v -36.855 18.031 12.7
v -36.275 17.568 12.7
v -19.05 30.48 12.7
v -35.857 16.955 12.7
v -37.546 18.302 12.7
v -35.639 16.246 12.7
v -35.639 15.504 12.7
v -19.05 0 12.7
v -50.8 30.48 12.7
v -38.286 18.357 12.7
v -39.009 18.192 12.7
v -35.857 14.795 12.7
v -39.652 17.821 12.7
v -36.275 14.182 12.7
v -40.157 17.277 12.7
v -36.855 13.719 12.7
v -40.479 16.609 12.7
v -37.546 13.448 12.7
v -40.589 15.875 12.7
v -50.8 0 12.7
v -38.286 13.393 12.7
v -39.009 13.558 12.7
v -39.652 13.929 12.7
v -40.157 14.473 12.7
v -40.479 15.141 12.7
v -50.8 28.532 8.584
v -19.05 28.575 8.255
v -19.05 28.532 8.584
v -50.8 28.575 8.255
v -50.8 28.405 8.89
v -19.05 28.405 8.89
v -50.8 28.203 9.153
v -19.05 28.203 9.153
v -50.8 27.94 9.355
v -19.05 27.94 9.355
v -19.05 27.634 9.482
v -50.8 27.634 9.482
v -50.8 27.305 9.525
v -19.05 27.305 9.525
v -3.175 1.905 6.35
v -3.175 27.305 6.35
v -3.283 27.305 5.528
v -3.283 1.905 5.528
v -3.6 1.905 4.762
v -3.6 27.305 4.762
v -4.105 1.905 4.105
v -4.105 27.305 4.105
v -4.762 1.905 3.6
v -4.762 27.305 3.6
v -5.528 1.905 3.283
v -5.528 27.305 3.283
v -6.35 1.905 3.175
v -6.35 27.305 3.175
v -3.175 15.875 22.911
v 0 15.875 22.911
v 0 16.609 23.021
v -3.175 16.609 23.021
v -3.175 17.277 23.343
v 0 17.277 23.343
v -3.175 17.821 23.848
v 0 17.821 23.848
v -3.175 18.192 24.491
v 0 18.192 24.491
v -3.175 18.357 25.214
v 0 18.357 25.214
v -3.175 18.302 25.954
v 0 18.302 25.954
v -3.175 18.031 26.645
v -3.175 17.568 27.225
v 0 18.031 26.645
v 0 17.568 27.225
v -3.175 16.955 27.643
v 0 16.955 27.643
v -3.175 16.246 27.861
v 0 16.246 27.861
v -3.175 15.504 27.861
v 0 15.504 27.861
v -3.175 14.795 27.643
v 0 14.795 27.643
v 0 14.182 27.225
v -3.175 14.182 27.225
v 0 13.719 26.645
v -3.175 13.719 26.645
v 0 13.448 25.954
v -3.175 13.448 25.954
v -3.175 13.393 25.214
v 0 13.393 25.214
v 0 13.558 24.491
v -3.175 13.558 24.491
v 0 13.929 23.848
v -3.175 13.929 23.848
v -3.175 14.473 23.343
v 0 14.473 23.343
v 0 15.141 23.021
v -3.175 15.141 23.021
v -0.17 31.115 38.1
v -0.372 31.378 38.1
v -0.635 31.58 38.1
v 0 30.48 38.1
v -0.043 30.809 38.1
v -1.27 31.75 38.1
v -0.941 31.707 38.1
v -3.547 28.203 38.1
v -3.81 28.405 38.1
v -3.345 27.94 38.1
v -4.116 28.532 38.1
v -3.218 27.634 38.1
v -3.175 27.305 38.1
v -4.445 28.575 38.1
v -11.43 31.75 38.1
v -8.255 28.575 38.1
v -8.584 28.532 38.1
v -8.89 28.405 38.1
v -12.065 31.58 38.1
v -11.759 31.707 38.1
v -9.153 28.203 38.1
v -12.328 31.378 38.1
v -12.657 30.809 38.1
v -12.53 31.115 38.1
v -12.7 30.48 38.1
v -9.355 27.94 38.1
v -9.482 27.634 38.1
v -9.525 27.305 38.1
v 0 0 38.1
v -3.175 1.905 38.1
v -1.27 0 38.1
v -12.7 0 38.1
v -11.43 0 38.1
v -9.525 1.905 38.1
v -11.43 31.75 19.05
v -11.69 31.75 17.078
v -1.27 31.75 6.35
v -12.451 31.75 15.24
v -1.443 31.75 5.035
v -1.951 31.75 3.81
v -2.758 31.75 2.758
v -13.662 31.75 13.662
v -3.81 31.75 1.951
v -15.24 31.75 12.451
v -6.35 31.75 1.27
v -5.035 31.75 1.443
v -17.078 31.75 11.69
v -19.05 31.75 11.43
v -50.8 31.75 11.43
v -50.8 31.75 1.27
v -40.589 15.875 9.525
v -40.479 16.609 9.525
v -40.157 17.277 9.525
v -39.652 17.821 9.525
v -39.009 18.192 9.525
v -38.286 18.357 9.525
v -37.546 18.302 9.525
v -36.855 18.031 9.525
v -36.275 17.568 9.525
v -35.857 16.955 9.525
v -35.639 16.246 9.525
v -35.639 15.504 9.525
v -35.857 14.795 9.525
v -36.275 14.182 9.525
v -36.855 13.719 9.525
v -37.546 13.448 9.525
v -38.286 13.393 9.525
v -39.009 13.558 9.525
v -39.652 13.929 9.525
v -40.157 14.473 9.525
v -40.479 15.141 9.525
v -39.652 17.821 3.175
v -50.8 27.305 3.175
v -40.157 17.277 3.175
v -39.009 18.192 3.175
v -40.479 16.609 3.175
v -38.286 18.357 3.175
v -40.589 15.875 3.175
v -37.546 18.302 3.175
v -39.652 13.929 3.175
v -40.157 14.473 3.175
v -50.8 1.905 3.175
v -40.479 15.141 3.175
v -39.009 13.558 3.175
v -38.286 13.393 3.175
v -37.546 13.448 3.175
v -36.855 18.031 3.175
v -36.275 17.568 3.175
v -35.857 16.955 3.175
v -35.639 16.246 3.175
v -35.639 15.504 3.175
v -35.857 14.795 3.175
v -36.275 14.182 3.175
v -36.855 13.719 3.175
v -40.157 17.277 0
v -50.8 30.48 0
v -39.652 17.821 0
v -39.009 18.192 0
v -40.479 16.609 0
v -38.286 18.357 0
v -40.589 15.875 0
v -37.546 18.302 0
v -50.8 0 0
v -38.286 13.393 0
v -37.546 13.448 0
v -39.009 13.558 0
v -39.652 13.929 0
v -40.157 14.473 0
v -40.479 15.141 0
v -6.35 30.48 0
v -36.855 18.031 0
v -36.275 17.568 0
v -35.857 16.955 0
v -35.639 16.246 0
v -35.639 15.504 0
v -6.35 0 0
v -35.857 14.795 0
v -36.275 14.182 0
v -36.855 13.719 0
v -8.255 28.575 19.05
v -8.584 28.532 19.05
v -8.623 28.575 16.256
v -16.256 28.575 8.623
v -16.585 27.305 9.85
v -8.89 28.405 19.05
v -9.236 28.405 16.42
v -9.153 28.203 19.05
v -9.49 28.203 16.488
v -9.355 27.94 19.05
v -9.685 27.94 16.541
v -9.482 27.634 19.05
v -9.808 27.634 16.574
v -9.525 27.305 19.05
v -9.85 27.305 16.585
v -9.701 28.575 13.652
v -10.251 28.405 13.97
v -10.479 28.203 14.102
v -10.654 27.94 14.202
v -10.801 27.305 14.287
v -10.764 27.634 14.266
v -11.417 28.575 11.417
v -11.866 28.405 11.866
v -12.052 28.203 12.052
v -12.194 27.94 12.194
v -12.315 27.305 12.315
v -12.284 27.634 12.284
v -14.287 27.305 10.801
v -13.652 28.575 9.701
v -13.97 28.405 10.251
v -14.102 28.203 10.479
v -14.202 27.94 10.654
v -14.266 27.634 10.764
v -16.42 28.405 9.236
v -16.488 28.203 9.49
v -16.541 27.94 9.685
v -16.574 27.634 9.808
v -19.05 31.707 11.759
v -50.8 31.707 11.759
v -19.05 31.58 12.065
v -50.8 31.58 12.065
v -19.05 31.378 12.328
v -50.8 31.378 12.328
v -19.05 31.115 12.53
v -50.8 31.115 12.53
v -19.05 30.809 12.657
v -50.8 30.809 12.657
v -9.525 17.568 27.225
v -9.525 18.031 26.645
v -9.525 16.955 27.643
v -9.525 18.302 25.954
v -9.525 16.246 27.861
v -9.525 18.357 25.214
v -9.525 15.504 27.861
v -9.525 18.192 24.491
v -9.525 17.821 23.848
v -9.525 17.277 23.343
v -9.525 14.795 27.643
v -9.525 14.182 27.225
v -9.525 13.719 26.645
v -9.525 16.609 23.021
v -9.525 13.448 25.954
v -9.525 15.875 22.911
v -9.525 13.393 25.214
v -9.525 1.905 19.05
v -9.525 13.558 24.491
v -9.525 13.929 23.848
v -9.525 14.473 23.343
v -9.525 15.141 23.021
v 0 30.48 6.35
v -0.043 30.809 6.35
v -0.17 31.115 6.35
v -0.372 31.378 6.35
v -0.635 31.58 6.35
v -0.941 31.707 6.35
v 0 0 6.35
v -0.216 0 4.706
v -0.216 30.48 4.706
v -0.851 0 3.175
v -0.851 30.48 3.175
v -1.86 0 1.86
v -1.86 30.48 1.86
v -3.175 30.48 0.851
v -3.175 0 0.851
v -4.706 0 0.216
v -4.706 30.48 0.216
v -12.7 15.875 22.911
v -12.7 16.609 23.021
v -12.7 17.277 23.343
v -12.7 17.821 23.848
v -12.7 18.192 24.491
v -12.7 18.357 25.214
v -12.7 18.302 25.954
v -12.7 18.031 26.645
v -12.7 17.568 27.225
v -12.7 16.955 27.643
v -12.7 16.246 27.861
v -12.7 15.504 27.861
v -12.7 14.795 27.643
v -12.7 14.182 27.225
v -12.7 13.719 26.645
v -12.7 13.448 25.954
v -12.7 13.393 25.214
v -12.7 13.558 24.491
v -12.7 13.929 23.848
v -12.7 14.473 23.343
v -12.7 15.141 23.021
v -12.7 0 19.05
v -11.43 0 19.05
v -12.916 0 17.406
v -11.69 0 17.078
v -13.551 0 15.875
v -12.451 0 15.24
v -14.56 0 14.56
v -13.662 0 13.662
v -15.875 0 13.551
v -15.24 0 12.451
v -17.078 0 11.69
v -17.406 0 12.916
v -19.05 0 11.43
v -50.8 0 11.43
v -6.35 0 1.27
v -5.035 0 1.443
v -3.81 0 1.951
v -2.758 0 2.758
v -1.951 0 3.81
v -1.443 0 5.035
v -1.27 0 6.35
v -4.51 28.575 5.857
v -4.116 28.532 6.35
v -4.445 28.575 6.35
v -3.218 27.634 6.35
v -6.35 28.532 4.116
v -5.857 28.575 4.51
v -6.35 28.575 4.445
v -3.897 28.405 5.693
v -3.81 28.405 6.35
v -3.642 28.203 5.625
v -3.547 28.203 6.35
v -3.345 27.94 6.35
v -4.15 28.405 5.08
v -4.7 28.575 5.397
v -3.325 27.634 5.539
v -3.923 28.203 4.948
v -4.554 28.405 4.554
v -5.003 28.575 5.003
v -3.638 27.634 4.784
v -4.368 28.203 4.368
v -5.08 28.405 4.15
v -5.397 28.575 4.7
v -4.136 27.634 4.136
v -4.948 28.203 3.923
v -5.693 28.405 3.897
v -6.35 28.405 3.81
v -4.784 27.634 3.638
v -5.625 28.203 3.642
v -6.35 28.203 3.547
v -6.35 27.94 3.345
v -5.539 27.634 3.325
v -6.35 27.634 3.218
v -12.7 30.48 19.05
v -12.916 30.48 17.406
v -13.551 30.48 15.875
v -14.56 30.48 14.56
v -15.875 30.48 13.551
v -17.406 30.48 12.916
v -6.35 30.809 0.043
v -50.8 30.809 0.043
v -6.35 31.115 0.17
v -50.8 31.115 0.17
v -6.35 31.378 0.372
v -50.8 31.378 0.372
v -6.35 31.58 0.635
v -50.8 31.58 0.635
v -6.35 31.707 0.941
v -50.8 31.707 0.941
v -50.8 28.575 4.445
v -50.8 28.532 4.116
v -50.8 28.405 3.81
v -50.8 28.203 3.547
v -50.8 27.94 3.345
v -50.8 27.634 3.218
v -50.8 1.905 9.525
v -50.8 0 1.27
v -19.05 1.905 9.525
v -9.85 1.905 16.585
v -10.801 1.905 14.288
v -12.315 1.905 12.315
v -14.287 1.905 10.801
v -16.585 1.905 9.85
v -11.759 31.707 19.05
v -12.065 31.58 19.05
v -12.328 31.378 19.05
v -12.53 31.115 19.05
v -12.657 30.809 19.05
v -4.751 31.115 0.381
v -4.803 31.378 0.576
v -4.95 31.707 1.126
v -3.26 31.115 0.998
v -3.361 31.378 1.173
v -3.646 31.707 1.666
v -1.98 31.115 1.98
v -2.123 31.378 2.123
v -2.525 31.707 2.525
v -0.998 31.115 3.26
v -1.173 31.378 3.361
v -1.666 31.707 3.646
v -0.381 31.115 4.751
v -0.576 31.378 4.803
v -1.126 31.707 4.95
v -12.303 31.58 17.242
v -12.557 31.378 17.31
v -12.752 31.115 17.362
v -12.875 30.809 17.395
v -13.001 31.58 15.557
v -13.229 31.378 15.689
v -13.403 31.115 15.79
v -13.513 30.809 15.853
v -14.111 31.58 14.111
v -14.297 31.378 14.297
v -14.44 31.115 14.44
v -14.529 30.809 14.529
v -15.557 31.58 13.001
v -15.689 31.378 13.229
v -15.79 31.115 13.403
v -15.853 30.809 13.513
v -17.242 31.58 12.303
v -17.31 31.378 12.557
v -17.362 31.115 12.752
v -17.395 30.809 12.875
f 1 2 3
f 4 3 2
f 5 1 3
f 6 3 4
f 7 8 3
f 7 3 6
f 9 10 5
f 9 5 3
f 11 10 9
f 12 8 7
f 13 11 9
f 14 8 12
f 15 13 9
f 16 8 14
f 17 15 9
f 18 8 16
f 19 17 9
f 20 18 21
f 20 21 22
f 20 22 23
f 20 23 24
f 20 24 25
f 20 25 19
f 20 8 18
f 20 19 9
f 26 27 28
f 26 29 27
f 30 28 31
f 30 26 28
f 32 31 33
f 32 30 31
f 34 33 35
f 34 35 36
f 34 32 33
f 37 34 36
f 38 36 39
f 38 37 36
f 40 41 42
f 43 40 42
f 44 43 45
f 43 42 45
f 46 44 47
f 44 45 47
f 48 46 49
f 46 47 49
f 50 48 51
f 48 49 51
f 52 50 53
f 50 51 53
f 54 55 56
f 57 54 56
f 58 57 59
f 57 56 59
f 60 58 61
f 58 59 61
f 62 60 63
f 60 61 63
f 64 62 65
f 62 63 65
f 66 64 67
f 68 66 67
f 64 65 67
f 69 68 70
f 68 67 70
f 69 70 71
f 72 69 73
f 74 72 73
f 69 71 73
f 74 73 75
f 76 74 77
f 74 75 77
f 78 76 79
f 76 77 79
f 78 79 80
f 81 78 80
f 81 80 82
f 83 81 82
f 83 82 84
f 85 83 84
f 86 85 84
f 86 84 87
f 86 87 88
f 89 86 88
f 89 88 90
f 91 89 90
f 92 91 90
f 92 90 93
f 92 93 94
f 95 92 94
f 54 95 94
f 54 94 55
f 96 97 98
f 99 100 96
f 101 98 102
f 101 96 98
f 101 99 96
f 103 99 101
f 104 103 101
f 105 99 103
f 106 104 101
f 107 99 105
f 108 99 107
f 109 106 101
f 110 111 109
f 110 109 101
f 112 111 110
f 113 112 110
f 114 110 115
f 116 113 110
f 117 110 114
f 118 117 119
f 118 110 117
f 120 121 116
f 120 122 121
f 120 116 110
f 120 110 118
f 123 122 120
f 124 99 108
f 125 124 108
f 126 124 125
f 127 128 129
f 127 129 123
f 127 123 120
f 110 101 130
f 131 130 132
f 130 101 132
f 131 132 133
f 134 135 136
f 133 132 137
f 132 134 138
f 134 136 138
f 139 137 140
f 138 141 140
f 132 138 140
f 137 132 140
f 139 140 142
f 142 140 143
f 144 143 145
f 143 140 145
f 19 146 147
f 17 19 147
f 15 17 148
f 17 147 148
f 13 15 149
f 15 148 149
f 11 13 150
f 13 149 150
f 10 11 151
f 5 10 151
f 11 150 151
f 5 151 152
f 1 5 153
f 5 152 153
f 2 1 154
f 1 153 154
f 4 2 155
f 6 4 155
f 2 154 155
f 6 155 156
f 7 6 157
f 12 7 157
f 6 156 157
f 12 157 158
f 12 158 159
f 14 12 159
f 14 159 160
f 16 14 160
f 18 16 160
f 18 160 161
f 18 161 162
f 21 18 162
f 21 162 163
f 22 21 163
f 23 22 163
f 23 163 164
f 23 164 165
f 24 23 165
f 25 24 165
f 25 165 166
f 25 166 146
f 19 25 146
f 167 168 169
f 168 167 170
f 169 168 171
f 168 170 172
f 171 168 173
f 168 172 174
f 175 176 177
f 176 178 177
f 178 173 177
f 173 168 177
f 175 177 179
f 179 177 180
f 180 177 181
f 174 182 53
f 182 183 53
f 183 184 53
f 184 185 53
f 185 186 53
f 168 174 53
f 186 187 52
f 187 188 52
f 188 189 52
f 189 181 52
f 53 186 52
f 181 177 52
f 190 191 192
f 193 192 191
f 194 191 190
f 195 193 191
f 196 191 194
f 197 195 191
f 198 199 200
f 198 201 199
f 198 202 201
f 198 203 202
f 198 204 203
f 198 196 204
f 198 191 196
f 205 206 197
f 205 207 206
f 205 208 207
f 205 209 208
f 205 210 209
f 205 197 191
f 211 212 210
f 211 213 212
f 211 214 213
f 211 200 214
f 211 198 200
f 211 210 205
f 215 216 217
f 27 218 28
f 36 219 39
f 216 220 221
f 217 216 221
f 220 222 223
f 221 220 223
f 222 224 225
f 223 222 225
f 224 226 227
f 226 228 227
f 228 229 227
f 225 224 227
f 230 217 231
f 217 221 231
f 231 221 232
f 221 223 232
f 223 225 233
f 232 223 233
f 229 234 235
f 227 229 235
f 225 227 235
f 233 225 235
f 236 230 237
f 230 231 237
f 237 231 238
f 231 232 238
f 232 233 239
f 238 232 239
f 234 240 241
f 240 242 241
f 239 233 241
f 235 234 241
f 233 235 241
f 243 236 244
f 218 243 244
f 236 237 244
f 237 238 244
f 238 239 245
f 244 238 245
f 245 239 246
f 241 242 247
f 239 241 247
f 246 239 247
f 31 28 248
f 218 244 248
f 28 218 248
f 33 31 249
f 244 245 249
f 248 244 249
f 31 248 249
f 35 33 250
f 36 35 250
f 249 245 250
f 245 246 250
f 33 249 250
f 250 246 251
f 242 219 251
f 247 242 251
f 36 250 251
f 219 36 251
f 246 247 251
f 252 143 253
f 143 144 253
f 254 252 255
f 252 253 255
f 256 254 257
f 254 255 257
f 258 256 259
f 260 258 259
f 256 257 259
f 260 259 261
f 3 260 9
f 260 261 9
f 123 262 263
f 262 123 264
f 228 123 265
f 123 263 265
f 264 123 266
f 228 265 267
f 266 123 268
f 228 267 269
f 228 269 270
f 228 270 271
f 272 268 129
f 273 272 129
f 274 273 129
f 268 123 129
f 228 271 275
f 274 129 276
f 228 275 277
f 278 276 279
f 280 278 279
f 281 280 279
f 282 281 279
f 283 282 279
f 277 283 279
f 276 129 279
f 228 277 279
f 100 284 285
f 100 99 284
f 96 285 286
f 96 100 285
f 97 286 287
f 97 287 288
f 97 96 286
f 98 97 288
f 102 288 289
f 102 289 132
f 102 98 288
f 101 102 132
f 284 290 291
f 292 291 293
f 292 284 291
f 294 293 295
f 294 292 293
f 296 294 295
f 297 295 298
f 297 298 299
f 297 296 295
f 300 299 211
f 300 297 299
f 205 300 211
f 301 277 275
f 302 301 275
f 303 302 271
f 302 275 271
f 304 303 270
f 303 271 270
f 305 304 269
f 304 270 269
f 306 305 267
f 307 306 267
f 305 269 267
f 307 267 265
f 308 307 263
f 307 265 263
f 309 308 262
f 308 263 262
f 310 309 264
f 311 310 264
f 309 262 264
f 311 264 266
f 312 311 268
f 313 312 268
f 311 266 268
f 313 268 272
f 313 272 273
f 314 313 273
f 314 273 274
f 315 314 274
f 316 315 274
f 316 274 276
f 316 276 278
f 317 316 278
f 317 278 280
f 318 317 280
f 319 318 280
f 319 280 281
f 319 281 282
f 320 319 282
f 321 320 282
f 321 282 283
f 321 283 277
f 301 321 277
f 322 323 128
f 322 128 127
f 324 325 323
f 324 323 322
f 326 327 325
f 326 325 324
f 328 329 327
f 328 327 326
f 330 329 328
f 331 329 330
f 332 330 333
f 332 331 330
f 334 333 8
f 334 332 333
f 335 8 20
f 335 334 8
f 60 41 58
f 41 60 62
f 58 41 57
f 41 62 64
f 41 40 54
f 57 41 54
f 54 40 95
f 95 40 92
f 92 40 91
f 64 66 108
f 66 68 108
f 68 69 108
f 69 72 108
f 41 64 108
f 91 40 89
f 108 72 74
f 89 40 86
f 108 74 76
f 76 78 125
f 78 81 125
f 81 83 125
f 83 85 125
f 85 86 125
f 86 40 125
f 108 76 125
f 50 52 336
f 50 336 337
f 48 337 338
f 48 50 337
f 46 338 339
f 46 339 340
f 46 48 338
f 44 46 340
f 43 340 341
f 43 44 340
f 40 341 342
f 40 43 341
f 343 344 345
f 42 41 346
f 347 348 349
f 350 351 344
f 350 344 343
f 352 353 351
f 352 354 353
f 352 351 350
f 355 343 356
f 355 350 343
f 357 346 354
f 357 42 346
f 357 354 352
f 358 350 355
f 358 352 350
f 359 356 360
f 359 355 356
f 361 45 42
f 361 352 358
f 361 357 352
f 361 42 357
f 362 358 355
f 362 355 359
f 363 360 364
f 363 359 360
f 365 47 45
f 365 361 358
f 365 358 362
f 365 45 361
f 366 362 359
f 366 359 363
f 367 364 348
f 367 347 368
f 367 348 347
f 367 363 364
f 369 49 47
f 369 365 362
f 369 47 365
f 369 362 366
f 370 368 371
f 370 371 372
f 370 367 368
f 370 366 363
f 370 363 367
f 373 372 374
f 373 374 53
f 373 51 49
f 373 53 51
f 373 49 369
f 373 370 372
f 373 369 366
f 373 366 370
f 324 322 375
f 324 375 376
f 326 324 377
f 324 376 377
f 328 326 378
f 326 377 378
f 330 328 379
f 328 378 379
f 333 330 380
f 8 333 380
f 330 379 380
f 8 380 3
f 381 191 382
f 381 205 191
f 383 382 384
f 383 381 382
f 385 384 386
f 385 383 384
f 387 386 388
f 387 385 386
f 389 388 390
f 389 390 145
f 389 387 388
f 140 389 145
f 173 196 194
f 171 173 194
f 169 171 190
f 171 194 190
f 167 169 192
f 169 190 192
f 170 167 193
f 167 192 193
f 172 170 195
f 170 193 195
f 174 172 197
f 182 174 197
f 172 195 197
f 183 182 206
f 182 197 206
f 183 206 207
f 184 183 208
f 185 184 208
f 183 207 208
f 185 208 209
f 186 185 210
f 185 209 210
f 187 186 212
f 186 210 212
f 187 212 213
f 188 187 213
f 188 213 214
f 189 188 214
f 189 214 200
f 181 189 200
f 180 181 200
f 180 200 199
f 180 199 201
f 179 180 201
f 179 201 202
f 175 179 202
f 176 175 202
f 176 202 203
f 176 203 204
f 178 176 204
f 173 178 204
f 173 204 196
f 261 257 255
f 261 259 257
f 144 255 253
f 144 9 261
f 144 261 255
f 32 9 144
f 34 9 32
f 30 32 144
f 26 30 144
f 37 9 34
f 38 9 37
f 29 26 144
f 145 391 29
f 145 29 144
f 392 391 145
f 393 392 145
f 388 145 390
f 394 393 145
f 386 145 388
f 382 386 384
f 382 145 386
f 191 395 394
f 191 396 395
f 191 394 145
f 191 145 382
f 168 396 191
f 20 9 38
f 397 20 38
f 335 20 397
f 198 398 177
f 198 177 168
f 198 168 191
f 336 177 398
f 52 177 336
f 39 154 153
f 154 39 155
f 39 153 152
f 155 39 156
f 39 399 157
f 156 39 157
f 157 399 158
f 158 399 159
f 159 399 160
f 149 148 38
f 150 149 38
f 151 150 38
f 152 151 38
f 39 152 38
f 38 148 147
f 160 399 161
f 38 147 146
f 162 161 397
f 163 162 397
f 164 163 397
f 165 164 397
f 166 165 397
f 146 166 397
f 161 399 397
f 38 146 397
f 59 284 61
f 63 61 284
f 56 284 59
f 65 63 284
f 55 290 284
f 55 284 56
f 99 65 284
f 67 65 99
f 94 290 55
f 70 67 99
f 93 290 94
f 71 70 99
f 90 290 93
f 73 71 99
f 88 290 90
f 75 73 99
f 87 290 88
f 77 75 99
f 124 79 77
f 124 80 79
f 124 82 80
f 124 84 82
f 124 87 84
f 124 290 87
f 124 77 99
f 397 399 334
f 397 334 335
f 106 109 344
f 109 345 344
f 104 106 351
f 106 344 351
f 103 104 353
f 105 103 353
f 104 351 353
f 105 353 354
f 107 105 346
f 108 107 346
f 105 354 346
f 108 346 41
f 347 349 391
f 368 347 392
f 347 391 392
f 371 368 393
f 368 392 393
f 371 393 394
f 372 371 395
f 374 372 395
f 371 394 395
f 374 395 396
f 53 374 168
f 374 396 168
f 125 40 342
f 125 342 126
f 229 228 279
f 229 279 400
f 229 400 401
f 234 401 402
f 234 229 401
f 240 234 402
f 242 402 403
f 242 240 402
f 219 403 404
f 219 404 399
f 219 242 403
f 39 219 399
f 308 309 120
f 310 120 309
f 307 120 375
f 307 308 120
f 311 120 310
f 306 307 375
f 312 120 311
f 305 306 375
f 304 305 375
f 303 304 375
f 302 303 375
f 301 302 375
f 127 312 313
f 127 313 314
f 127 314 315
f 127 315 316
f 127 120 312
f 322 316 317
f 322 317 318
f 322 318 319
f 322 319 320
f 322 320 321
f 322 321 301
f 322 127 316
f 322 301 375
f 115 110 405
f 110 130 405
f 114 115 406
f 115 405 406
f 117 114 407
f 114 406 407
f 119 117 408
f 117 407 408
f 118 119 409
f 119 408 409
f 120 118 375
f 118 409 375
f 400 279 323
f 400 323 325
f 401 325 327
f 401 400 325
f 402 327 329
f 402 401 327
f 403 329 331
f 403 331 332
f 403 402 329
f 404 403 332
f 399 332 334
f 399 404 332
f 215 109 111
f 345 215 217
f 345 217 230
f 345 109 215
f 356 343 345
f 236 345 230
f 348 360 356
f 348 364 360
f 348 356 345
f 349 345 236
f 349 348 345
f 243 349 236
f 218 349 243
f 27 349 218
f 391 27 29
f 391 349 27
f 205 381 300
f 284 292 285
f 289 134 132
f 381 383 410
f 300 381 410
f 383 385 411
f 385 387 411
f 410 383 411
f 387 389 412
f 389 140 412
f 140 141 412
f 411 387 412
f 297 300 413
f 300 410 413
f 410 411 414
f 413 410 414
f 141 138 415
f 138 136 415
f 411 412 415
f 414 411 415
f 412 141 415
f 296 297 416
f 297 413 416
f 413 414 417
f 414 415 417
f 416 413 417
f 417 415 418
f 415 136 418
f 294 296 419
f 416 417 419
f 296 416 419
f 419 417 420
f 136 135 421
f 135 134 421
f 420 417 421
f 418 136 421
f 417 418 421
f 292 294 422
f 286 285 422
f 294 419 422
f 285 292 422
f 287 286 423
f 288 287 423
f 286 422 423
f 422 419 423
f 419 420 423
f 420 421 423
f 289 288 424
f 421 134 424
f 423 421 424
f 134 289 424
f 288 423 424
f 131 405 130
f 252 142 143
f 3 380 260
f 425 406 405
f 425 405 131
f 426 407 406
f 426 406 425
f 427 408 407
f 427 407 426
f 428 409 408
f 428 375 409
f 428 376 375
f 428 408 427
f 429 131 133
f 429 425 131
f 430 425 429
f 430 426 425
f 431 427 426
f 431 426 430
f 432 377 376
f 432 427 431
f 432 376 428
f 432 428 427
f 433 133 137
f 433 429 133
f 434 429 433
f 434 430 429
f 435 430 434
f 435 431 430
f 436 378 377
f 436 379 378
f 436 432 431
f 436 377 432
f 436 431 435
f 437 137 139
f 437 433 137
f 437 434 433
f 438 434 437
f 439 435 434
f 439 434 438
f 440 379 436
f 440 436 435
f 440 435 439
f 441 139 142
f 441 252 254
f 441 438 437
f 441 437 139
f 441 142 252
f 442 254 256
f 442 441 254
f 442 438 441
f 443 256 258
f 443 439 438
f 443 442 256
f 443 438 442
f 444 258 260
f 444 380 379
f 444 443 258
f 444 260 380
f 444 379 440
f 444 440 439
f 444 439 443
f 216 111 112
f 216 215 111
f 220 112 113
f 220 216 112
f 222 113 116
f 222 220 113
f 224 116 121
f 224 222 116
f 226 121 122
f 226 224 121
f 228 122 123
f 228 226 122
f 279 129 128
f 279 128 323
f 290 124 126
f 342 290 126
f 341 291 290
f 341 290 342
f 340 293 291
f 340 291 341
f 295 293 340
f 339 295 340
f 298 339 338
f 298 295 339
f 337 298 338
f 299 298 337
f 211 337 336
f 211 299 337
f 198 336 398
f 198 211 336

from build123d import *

# Parameters (mm, degrees)
BOSS_EXTRUDE1_DEPTH        = 31.75
FILLET1_R                  = 6.35
SHELL1_T                   = -3.175
F_9_0_196_DIAMETER_HOLE1_D = 4.9784
F_9_0_196_DIAMETER_HOLE2_D = 4.9784
CHAMFER1_SIZE              = 1.905
FILLET2_R                  = 1.27


with BuildPart() as part:
    # Sketch1 → Boss-Extrude1 (new body)
    with BuildSketch(Plane(origin=(0, 0, 0), x_dir=(1, 0, 0), z_dir=(0, 1, 0))):
        Polygon((0, 0), (0, -38.1), (-12.7, -38.1), (-12.7, -12.7), (-50.8, -12.7), (-50.8, 0), align=None)
    extrude(amount=BOSS_EXTRUDE1_DEPTH)

    # Fillet1
    fillet1_edges = [part.edges().sort_by_distance(p)[0] for p in [
        (0, 15.875, 0),
        (-12.7, 15.875, 12.7),
    ]]
    fillet(fillet1_edges, radius=FILLET1_R)

    # Shell1
    shell1_openings = [part.faces().sort_by_distance(p)[0] for p in [
        (-6.35, 15.875, 38.1),
        (-50.8, 15.875, 6.35),
        (-18.721217985, 0, 15.546217985),
    ]]
    offset(amount=SHELL1_T, openings=shell1_openings, kind=Kind.INTERSECTION)

    # #9 (0.196) Diameter Hole1 (through all)
    with Locations(Plane.ZY.offset(12.7)):
        with Locations((25.4, 15.875)):
            Hole(F_9_0_196_DIAMETER_HOLE1_D / 2)

    # #9 (0.196) Diameter Hole2 (through all)
    with Locations(Plane.XY.offset(12.7)):
        with Locations((-38.1, 15.875)):
            Hole(F_9_0_196_DIAMETER_HOLE2_D / 2)

    # Chamfer1
    chamfer1_edges = [part.edges().sort_by_distance(p)[0] for p in [
        (-28.575, 0, 3.175),
        (-34.925, 0, 9.525),
        (-9.525, 0, 28.575),
        (-3.175, 0, 22.225),
        (-4.10493597, 0, 4.10493597),
        (-12.314807909, 0, 12.314807909),
    ]]
    chamfer(chamfer1_edges, length=CHAMFER1_SIZE)

    # Fillet2
    fillet2_edges = [part.edges().sort_by_distance(p)[0] for p in [
        (-34.925, 31.75, 12.7),
        (-28.575, 31.75, 0),
        (-12.7, 31.75, 28.575),
        (-1.859871939, 31.75, 1.859871939),
        (0, 31.75, 22.225),
        (-14.559871939, 31.75, 14.559871939),
        (-3.175, 28.575, 22.225),
        (-4.10493597, 28.575, 4.10493597),
        (-28.575, 28.575, 3.175),
        (-34.925, 28.575, 9.525),
        (-12.314807909, 28.575, 12.314807909),
        (-9.525, 28.575, 28.575),
    ]]
    fillet(fillet2_edges, radius=FILLET2_R)


solid = part.part
